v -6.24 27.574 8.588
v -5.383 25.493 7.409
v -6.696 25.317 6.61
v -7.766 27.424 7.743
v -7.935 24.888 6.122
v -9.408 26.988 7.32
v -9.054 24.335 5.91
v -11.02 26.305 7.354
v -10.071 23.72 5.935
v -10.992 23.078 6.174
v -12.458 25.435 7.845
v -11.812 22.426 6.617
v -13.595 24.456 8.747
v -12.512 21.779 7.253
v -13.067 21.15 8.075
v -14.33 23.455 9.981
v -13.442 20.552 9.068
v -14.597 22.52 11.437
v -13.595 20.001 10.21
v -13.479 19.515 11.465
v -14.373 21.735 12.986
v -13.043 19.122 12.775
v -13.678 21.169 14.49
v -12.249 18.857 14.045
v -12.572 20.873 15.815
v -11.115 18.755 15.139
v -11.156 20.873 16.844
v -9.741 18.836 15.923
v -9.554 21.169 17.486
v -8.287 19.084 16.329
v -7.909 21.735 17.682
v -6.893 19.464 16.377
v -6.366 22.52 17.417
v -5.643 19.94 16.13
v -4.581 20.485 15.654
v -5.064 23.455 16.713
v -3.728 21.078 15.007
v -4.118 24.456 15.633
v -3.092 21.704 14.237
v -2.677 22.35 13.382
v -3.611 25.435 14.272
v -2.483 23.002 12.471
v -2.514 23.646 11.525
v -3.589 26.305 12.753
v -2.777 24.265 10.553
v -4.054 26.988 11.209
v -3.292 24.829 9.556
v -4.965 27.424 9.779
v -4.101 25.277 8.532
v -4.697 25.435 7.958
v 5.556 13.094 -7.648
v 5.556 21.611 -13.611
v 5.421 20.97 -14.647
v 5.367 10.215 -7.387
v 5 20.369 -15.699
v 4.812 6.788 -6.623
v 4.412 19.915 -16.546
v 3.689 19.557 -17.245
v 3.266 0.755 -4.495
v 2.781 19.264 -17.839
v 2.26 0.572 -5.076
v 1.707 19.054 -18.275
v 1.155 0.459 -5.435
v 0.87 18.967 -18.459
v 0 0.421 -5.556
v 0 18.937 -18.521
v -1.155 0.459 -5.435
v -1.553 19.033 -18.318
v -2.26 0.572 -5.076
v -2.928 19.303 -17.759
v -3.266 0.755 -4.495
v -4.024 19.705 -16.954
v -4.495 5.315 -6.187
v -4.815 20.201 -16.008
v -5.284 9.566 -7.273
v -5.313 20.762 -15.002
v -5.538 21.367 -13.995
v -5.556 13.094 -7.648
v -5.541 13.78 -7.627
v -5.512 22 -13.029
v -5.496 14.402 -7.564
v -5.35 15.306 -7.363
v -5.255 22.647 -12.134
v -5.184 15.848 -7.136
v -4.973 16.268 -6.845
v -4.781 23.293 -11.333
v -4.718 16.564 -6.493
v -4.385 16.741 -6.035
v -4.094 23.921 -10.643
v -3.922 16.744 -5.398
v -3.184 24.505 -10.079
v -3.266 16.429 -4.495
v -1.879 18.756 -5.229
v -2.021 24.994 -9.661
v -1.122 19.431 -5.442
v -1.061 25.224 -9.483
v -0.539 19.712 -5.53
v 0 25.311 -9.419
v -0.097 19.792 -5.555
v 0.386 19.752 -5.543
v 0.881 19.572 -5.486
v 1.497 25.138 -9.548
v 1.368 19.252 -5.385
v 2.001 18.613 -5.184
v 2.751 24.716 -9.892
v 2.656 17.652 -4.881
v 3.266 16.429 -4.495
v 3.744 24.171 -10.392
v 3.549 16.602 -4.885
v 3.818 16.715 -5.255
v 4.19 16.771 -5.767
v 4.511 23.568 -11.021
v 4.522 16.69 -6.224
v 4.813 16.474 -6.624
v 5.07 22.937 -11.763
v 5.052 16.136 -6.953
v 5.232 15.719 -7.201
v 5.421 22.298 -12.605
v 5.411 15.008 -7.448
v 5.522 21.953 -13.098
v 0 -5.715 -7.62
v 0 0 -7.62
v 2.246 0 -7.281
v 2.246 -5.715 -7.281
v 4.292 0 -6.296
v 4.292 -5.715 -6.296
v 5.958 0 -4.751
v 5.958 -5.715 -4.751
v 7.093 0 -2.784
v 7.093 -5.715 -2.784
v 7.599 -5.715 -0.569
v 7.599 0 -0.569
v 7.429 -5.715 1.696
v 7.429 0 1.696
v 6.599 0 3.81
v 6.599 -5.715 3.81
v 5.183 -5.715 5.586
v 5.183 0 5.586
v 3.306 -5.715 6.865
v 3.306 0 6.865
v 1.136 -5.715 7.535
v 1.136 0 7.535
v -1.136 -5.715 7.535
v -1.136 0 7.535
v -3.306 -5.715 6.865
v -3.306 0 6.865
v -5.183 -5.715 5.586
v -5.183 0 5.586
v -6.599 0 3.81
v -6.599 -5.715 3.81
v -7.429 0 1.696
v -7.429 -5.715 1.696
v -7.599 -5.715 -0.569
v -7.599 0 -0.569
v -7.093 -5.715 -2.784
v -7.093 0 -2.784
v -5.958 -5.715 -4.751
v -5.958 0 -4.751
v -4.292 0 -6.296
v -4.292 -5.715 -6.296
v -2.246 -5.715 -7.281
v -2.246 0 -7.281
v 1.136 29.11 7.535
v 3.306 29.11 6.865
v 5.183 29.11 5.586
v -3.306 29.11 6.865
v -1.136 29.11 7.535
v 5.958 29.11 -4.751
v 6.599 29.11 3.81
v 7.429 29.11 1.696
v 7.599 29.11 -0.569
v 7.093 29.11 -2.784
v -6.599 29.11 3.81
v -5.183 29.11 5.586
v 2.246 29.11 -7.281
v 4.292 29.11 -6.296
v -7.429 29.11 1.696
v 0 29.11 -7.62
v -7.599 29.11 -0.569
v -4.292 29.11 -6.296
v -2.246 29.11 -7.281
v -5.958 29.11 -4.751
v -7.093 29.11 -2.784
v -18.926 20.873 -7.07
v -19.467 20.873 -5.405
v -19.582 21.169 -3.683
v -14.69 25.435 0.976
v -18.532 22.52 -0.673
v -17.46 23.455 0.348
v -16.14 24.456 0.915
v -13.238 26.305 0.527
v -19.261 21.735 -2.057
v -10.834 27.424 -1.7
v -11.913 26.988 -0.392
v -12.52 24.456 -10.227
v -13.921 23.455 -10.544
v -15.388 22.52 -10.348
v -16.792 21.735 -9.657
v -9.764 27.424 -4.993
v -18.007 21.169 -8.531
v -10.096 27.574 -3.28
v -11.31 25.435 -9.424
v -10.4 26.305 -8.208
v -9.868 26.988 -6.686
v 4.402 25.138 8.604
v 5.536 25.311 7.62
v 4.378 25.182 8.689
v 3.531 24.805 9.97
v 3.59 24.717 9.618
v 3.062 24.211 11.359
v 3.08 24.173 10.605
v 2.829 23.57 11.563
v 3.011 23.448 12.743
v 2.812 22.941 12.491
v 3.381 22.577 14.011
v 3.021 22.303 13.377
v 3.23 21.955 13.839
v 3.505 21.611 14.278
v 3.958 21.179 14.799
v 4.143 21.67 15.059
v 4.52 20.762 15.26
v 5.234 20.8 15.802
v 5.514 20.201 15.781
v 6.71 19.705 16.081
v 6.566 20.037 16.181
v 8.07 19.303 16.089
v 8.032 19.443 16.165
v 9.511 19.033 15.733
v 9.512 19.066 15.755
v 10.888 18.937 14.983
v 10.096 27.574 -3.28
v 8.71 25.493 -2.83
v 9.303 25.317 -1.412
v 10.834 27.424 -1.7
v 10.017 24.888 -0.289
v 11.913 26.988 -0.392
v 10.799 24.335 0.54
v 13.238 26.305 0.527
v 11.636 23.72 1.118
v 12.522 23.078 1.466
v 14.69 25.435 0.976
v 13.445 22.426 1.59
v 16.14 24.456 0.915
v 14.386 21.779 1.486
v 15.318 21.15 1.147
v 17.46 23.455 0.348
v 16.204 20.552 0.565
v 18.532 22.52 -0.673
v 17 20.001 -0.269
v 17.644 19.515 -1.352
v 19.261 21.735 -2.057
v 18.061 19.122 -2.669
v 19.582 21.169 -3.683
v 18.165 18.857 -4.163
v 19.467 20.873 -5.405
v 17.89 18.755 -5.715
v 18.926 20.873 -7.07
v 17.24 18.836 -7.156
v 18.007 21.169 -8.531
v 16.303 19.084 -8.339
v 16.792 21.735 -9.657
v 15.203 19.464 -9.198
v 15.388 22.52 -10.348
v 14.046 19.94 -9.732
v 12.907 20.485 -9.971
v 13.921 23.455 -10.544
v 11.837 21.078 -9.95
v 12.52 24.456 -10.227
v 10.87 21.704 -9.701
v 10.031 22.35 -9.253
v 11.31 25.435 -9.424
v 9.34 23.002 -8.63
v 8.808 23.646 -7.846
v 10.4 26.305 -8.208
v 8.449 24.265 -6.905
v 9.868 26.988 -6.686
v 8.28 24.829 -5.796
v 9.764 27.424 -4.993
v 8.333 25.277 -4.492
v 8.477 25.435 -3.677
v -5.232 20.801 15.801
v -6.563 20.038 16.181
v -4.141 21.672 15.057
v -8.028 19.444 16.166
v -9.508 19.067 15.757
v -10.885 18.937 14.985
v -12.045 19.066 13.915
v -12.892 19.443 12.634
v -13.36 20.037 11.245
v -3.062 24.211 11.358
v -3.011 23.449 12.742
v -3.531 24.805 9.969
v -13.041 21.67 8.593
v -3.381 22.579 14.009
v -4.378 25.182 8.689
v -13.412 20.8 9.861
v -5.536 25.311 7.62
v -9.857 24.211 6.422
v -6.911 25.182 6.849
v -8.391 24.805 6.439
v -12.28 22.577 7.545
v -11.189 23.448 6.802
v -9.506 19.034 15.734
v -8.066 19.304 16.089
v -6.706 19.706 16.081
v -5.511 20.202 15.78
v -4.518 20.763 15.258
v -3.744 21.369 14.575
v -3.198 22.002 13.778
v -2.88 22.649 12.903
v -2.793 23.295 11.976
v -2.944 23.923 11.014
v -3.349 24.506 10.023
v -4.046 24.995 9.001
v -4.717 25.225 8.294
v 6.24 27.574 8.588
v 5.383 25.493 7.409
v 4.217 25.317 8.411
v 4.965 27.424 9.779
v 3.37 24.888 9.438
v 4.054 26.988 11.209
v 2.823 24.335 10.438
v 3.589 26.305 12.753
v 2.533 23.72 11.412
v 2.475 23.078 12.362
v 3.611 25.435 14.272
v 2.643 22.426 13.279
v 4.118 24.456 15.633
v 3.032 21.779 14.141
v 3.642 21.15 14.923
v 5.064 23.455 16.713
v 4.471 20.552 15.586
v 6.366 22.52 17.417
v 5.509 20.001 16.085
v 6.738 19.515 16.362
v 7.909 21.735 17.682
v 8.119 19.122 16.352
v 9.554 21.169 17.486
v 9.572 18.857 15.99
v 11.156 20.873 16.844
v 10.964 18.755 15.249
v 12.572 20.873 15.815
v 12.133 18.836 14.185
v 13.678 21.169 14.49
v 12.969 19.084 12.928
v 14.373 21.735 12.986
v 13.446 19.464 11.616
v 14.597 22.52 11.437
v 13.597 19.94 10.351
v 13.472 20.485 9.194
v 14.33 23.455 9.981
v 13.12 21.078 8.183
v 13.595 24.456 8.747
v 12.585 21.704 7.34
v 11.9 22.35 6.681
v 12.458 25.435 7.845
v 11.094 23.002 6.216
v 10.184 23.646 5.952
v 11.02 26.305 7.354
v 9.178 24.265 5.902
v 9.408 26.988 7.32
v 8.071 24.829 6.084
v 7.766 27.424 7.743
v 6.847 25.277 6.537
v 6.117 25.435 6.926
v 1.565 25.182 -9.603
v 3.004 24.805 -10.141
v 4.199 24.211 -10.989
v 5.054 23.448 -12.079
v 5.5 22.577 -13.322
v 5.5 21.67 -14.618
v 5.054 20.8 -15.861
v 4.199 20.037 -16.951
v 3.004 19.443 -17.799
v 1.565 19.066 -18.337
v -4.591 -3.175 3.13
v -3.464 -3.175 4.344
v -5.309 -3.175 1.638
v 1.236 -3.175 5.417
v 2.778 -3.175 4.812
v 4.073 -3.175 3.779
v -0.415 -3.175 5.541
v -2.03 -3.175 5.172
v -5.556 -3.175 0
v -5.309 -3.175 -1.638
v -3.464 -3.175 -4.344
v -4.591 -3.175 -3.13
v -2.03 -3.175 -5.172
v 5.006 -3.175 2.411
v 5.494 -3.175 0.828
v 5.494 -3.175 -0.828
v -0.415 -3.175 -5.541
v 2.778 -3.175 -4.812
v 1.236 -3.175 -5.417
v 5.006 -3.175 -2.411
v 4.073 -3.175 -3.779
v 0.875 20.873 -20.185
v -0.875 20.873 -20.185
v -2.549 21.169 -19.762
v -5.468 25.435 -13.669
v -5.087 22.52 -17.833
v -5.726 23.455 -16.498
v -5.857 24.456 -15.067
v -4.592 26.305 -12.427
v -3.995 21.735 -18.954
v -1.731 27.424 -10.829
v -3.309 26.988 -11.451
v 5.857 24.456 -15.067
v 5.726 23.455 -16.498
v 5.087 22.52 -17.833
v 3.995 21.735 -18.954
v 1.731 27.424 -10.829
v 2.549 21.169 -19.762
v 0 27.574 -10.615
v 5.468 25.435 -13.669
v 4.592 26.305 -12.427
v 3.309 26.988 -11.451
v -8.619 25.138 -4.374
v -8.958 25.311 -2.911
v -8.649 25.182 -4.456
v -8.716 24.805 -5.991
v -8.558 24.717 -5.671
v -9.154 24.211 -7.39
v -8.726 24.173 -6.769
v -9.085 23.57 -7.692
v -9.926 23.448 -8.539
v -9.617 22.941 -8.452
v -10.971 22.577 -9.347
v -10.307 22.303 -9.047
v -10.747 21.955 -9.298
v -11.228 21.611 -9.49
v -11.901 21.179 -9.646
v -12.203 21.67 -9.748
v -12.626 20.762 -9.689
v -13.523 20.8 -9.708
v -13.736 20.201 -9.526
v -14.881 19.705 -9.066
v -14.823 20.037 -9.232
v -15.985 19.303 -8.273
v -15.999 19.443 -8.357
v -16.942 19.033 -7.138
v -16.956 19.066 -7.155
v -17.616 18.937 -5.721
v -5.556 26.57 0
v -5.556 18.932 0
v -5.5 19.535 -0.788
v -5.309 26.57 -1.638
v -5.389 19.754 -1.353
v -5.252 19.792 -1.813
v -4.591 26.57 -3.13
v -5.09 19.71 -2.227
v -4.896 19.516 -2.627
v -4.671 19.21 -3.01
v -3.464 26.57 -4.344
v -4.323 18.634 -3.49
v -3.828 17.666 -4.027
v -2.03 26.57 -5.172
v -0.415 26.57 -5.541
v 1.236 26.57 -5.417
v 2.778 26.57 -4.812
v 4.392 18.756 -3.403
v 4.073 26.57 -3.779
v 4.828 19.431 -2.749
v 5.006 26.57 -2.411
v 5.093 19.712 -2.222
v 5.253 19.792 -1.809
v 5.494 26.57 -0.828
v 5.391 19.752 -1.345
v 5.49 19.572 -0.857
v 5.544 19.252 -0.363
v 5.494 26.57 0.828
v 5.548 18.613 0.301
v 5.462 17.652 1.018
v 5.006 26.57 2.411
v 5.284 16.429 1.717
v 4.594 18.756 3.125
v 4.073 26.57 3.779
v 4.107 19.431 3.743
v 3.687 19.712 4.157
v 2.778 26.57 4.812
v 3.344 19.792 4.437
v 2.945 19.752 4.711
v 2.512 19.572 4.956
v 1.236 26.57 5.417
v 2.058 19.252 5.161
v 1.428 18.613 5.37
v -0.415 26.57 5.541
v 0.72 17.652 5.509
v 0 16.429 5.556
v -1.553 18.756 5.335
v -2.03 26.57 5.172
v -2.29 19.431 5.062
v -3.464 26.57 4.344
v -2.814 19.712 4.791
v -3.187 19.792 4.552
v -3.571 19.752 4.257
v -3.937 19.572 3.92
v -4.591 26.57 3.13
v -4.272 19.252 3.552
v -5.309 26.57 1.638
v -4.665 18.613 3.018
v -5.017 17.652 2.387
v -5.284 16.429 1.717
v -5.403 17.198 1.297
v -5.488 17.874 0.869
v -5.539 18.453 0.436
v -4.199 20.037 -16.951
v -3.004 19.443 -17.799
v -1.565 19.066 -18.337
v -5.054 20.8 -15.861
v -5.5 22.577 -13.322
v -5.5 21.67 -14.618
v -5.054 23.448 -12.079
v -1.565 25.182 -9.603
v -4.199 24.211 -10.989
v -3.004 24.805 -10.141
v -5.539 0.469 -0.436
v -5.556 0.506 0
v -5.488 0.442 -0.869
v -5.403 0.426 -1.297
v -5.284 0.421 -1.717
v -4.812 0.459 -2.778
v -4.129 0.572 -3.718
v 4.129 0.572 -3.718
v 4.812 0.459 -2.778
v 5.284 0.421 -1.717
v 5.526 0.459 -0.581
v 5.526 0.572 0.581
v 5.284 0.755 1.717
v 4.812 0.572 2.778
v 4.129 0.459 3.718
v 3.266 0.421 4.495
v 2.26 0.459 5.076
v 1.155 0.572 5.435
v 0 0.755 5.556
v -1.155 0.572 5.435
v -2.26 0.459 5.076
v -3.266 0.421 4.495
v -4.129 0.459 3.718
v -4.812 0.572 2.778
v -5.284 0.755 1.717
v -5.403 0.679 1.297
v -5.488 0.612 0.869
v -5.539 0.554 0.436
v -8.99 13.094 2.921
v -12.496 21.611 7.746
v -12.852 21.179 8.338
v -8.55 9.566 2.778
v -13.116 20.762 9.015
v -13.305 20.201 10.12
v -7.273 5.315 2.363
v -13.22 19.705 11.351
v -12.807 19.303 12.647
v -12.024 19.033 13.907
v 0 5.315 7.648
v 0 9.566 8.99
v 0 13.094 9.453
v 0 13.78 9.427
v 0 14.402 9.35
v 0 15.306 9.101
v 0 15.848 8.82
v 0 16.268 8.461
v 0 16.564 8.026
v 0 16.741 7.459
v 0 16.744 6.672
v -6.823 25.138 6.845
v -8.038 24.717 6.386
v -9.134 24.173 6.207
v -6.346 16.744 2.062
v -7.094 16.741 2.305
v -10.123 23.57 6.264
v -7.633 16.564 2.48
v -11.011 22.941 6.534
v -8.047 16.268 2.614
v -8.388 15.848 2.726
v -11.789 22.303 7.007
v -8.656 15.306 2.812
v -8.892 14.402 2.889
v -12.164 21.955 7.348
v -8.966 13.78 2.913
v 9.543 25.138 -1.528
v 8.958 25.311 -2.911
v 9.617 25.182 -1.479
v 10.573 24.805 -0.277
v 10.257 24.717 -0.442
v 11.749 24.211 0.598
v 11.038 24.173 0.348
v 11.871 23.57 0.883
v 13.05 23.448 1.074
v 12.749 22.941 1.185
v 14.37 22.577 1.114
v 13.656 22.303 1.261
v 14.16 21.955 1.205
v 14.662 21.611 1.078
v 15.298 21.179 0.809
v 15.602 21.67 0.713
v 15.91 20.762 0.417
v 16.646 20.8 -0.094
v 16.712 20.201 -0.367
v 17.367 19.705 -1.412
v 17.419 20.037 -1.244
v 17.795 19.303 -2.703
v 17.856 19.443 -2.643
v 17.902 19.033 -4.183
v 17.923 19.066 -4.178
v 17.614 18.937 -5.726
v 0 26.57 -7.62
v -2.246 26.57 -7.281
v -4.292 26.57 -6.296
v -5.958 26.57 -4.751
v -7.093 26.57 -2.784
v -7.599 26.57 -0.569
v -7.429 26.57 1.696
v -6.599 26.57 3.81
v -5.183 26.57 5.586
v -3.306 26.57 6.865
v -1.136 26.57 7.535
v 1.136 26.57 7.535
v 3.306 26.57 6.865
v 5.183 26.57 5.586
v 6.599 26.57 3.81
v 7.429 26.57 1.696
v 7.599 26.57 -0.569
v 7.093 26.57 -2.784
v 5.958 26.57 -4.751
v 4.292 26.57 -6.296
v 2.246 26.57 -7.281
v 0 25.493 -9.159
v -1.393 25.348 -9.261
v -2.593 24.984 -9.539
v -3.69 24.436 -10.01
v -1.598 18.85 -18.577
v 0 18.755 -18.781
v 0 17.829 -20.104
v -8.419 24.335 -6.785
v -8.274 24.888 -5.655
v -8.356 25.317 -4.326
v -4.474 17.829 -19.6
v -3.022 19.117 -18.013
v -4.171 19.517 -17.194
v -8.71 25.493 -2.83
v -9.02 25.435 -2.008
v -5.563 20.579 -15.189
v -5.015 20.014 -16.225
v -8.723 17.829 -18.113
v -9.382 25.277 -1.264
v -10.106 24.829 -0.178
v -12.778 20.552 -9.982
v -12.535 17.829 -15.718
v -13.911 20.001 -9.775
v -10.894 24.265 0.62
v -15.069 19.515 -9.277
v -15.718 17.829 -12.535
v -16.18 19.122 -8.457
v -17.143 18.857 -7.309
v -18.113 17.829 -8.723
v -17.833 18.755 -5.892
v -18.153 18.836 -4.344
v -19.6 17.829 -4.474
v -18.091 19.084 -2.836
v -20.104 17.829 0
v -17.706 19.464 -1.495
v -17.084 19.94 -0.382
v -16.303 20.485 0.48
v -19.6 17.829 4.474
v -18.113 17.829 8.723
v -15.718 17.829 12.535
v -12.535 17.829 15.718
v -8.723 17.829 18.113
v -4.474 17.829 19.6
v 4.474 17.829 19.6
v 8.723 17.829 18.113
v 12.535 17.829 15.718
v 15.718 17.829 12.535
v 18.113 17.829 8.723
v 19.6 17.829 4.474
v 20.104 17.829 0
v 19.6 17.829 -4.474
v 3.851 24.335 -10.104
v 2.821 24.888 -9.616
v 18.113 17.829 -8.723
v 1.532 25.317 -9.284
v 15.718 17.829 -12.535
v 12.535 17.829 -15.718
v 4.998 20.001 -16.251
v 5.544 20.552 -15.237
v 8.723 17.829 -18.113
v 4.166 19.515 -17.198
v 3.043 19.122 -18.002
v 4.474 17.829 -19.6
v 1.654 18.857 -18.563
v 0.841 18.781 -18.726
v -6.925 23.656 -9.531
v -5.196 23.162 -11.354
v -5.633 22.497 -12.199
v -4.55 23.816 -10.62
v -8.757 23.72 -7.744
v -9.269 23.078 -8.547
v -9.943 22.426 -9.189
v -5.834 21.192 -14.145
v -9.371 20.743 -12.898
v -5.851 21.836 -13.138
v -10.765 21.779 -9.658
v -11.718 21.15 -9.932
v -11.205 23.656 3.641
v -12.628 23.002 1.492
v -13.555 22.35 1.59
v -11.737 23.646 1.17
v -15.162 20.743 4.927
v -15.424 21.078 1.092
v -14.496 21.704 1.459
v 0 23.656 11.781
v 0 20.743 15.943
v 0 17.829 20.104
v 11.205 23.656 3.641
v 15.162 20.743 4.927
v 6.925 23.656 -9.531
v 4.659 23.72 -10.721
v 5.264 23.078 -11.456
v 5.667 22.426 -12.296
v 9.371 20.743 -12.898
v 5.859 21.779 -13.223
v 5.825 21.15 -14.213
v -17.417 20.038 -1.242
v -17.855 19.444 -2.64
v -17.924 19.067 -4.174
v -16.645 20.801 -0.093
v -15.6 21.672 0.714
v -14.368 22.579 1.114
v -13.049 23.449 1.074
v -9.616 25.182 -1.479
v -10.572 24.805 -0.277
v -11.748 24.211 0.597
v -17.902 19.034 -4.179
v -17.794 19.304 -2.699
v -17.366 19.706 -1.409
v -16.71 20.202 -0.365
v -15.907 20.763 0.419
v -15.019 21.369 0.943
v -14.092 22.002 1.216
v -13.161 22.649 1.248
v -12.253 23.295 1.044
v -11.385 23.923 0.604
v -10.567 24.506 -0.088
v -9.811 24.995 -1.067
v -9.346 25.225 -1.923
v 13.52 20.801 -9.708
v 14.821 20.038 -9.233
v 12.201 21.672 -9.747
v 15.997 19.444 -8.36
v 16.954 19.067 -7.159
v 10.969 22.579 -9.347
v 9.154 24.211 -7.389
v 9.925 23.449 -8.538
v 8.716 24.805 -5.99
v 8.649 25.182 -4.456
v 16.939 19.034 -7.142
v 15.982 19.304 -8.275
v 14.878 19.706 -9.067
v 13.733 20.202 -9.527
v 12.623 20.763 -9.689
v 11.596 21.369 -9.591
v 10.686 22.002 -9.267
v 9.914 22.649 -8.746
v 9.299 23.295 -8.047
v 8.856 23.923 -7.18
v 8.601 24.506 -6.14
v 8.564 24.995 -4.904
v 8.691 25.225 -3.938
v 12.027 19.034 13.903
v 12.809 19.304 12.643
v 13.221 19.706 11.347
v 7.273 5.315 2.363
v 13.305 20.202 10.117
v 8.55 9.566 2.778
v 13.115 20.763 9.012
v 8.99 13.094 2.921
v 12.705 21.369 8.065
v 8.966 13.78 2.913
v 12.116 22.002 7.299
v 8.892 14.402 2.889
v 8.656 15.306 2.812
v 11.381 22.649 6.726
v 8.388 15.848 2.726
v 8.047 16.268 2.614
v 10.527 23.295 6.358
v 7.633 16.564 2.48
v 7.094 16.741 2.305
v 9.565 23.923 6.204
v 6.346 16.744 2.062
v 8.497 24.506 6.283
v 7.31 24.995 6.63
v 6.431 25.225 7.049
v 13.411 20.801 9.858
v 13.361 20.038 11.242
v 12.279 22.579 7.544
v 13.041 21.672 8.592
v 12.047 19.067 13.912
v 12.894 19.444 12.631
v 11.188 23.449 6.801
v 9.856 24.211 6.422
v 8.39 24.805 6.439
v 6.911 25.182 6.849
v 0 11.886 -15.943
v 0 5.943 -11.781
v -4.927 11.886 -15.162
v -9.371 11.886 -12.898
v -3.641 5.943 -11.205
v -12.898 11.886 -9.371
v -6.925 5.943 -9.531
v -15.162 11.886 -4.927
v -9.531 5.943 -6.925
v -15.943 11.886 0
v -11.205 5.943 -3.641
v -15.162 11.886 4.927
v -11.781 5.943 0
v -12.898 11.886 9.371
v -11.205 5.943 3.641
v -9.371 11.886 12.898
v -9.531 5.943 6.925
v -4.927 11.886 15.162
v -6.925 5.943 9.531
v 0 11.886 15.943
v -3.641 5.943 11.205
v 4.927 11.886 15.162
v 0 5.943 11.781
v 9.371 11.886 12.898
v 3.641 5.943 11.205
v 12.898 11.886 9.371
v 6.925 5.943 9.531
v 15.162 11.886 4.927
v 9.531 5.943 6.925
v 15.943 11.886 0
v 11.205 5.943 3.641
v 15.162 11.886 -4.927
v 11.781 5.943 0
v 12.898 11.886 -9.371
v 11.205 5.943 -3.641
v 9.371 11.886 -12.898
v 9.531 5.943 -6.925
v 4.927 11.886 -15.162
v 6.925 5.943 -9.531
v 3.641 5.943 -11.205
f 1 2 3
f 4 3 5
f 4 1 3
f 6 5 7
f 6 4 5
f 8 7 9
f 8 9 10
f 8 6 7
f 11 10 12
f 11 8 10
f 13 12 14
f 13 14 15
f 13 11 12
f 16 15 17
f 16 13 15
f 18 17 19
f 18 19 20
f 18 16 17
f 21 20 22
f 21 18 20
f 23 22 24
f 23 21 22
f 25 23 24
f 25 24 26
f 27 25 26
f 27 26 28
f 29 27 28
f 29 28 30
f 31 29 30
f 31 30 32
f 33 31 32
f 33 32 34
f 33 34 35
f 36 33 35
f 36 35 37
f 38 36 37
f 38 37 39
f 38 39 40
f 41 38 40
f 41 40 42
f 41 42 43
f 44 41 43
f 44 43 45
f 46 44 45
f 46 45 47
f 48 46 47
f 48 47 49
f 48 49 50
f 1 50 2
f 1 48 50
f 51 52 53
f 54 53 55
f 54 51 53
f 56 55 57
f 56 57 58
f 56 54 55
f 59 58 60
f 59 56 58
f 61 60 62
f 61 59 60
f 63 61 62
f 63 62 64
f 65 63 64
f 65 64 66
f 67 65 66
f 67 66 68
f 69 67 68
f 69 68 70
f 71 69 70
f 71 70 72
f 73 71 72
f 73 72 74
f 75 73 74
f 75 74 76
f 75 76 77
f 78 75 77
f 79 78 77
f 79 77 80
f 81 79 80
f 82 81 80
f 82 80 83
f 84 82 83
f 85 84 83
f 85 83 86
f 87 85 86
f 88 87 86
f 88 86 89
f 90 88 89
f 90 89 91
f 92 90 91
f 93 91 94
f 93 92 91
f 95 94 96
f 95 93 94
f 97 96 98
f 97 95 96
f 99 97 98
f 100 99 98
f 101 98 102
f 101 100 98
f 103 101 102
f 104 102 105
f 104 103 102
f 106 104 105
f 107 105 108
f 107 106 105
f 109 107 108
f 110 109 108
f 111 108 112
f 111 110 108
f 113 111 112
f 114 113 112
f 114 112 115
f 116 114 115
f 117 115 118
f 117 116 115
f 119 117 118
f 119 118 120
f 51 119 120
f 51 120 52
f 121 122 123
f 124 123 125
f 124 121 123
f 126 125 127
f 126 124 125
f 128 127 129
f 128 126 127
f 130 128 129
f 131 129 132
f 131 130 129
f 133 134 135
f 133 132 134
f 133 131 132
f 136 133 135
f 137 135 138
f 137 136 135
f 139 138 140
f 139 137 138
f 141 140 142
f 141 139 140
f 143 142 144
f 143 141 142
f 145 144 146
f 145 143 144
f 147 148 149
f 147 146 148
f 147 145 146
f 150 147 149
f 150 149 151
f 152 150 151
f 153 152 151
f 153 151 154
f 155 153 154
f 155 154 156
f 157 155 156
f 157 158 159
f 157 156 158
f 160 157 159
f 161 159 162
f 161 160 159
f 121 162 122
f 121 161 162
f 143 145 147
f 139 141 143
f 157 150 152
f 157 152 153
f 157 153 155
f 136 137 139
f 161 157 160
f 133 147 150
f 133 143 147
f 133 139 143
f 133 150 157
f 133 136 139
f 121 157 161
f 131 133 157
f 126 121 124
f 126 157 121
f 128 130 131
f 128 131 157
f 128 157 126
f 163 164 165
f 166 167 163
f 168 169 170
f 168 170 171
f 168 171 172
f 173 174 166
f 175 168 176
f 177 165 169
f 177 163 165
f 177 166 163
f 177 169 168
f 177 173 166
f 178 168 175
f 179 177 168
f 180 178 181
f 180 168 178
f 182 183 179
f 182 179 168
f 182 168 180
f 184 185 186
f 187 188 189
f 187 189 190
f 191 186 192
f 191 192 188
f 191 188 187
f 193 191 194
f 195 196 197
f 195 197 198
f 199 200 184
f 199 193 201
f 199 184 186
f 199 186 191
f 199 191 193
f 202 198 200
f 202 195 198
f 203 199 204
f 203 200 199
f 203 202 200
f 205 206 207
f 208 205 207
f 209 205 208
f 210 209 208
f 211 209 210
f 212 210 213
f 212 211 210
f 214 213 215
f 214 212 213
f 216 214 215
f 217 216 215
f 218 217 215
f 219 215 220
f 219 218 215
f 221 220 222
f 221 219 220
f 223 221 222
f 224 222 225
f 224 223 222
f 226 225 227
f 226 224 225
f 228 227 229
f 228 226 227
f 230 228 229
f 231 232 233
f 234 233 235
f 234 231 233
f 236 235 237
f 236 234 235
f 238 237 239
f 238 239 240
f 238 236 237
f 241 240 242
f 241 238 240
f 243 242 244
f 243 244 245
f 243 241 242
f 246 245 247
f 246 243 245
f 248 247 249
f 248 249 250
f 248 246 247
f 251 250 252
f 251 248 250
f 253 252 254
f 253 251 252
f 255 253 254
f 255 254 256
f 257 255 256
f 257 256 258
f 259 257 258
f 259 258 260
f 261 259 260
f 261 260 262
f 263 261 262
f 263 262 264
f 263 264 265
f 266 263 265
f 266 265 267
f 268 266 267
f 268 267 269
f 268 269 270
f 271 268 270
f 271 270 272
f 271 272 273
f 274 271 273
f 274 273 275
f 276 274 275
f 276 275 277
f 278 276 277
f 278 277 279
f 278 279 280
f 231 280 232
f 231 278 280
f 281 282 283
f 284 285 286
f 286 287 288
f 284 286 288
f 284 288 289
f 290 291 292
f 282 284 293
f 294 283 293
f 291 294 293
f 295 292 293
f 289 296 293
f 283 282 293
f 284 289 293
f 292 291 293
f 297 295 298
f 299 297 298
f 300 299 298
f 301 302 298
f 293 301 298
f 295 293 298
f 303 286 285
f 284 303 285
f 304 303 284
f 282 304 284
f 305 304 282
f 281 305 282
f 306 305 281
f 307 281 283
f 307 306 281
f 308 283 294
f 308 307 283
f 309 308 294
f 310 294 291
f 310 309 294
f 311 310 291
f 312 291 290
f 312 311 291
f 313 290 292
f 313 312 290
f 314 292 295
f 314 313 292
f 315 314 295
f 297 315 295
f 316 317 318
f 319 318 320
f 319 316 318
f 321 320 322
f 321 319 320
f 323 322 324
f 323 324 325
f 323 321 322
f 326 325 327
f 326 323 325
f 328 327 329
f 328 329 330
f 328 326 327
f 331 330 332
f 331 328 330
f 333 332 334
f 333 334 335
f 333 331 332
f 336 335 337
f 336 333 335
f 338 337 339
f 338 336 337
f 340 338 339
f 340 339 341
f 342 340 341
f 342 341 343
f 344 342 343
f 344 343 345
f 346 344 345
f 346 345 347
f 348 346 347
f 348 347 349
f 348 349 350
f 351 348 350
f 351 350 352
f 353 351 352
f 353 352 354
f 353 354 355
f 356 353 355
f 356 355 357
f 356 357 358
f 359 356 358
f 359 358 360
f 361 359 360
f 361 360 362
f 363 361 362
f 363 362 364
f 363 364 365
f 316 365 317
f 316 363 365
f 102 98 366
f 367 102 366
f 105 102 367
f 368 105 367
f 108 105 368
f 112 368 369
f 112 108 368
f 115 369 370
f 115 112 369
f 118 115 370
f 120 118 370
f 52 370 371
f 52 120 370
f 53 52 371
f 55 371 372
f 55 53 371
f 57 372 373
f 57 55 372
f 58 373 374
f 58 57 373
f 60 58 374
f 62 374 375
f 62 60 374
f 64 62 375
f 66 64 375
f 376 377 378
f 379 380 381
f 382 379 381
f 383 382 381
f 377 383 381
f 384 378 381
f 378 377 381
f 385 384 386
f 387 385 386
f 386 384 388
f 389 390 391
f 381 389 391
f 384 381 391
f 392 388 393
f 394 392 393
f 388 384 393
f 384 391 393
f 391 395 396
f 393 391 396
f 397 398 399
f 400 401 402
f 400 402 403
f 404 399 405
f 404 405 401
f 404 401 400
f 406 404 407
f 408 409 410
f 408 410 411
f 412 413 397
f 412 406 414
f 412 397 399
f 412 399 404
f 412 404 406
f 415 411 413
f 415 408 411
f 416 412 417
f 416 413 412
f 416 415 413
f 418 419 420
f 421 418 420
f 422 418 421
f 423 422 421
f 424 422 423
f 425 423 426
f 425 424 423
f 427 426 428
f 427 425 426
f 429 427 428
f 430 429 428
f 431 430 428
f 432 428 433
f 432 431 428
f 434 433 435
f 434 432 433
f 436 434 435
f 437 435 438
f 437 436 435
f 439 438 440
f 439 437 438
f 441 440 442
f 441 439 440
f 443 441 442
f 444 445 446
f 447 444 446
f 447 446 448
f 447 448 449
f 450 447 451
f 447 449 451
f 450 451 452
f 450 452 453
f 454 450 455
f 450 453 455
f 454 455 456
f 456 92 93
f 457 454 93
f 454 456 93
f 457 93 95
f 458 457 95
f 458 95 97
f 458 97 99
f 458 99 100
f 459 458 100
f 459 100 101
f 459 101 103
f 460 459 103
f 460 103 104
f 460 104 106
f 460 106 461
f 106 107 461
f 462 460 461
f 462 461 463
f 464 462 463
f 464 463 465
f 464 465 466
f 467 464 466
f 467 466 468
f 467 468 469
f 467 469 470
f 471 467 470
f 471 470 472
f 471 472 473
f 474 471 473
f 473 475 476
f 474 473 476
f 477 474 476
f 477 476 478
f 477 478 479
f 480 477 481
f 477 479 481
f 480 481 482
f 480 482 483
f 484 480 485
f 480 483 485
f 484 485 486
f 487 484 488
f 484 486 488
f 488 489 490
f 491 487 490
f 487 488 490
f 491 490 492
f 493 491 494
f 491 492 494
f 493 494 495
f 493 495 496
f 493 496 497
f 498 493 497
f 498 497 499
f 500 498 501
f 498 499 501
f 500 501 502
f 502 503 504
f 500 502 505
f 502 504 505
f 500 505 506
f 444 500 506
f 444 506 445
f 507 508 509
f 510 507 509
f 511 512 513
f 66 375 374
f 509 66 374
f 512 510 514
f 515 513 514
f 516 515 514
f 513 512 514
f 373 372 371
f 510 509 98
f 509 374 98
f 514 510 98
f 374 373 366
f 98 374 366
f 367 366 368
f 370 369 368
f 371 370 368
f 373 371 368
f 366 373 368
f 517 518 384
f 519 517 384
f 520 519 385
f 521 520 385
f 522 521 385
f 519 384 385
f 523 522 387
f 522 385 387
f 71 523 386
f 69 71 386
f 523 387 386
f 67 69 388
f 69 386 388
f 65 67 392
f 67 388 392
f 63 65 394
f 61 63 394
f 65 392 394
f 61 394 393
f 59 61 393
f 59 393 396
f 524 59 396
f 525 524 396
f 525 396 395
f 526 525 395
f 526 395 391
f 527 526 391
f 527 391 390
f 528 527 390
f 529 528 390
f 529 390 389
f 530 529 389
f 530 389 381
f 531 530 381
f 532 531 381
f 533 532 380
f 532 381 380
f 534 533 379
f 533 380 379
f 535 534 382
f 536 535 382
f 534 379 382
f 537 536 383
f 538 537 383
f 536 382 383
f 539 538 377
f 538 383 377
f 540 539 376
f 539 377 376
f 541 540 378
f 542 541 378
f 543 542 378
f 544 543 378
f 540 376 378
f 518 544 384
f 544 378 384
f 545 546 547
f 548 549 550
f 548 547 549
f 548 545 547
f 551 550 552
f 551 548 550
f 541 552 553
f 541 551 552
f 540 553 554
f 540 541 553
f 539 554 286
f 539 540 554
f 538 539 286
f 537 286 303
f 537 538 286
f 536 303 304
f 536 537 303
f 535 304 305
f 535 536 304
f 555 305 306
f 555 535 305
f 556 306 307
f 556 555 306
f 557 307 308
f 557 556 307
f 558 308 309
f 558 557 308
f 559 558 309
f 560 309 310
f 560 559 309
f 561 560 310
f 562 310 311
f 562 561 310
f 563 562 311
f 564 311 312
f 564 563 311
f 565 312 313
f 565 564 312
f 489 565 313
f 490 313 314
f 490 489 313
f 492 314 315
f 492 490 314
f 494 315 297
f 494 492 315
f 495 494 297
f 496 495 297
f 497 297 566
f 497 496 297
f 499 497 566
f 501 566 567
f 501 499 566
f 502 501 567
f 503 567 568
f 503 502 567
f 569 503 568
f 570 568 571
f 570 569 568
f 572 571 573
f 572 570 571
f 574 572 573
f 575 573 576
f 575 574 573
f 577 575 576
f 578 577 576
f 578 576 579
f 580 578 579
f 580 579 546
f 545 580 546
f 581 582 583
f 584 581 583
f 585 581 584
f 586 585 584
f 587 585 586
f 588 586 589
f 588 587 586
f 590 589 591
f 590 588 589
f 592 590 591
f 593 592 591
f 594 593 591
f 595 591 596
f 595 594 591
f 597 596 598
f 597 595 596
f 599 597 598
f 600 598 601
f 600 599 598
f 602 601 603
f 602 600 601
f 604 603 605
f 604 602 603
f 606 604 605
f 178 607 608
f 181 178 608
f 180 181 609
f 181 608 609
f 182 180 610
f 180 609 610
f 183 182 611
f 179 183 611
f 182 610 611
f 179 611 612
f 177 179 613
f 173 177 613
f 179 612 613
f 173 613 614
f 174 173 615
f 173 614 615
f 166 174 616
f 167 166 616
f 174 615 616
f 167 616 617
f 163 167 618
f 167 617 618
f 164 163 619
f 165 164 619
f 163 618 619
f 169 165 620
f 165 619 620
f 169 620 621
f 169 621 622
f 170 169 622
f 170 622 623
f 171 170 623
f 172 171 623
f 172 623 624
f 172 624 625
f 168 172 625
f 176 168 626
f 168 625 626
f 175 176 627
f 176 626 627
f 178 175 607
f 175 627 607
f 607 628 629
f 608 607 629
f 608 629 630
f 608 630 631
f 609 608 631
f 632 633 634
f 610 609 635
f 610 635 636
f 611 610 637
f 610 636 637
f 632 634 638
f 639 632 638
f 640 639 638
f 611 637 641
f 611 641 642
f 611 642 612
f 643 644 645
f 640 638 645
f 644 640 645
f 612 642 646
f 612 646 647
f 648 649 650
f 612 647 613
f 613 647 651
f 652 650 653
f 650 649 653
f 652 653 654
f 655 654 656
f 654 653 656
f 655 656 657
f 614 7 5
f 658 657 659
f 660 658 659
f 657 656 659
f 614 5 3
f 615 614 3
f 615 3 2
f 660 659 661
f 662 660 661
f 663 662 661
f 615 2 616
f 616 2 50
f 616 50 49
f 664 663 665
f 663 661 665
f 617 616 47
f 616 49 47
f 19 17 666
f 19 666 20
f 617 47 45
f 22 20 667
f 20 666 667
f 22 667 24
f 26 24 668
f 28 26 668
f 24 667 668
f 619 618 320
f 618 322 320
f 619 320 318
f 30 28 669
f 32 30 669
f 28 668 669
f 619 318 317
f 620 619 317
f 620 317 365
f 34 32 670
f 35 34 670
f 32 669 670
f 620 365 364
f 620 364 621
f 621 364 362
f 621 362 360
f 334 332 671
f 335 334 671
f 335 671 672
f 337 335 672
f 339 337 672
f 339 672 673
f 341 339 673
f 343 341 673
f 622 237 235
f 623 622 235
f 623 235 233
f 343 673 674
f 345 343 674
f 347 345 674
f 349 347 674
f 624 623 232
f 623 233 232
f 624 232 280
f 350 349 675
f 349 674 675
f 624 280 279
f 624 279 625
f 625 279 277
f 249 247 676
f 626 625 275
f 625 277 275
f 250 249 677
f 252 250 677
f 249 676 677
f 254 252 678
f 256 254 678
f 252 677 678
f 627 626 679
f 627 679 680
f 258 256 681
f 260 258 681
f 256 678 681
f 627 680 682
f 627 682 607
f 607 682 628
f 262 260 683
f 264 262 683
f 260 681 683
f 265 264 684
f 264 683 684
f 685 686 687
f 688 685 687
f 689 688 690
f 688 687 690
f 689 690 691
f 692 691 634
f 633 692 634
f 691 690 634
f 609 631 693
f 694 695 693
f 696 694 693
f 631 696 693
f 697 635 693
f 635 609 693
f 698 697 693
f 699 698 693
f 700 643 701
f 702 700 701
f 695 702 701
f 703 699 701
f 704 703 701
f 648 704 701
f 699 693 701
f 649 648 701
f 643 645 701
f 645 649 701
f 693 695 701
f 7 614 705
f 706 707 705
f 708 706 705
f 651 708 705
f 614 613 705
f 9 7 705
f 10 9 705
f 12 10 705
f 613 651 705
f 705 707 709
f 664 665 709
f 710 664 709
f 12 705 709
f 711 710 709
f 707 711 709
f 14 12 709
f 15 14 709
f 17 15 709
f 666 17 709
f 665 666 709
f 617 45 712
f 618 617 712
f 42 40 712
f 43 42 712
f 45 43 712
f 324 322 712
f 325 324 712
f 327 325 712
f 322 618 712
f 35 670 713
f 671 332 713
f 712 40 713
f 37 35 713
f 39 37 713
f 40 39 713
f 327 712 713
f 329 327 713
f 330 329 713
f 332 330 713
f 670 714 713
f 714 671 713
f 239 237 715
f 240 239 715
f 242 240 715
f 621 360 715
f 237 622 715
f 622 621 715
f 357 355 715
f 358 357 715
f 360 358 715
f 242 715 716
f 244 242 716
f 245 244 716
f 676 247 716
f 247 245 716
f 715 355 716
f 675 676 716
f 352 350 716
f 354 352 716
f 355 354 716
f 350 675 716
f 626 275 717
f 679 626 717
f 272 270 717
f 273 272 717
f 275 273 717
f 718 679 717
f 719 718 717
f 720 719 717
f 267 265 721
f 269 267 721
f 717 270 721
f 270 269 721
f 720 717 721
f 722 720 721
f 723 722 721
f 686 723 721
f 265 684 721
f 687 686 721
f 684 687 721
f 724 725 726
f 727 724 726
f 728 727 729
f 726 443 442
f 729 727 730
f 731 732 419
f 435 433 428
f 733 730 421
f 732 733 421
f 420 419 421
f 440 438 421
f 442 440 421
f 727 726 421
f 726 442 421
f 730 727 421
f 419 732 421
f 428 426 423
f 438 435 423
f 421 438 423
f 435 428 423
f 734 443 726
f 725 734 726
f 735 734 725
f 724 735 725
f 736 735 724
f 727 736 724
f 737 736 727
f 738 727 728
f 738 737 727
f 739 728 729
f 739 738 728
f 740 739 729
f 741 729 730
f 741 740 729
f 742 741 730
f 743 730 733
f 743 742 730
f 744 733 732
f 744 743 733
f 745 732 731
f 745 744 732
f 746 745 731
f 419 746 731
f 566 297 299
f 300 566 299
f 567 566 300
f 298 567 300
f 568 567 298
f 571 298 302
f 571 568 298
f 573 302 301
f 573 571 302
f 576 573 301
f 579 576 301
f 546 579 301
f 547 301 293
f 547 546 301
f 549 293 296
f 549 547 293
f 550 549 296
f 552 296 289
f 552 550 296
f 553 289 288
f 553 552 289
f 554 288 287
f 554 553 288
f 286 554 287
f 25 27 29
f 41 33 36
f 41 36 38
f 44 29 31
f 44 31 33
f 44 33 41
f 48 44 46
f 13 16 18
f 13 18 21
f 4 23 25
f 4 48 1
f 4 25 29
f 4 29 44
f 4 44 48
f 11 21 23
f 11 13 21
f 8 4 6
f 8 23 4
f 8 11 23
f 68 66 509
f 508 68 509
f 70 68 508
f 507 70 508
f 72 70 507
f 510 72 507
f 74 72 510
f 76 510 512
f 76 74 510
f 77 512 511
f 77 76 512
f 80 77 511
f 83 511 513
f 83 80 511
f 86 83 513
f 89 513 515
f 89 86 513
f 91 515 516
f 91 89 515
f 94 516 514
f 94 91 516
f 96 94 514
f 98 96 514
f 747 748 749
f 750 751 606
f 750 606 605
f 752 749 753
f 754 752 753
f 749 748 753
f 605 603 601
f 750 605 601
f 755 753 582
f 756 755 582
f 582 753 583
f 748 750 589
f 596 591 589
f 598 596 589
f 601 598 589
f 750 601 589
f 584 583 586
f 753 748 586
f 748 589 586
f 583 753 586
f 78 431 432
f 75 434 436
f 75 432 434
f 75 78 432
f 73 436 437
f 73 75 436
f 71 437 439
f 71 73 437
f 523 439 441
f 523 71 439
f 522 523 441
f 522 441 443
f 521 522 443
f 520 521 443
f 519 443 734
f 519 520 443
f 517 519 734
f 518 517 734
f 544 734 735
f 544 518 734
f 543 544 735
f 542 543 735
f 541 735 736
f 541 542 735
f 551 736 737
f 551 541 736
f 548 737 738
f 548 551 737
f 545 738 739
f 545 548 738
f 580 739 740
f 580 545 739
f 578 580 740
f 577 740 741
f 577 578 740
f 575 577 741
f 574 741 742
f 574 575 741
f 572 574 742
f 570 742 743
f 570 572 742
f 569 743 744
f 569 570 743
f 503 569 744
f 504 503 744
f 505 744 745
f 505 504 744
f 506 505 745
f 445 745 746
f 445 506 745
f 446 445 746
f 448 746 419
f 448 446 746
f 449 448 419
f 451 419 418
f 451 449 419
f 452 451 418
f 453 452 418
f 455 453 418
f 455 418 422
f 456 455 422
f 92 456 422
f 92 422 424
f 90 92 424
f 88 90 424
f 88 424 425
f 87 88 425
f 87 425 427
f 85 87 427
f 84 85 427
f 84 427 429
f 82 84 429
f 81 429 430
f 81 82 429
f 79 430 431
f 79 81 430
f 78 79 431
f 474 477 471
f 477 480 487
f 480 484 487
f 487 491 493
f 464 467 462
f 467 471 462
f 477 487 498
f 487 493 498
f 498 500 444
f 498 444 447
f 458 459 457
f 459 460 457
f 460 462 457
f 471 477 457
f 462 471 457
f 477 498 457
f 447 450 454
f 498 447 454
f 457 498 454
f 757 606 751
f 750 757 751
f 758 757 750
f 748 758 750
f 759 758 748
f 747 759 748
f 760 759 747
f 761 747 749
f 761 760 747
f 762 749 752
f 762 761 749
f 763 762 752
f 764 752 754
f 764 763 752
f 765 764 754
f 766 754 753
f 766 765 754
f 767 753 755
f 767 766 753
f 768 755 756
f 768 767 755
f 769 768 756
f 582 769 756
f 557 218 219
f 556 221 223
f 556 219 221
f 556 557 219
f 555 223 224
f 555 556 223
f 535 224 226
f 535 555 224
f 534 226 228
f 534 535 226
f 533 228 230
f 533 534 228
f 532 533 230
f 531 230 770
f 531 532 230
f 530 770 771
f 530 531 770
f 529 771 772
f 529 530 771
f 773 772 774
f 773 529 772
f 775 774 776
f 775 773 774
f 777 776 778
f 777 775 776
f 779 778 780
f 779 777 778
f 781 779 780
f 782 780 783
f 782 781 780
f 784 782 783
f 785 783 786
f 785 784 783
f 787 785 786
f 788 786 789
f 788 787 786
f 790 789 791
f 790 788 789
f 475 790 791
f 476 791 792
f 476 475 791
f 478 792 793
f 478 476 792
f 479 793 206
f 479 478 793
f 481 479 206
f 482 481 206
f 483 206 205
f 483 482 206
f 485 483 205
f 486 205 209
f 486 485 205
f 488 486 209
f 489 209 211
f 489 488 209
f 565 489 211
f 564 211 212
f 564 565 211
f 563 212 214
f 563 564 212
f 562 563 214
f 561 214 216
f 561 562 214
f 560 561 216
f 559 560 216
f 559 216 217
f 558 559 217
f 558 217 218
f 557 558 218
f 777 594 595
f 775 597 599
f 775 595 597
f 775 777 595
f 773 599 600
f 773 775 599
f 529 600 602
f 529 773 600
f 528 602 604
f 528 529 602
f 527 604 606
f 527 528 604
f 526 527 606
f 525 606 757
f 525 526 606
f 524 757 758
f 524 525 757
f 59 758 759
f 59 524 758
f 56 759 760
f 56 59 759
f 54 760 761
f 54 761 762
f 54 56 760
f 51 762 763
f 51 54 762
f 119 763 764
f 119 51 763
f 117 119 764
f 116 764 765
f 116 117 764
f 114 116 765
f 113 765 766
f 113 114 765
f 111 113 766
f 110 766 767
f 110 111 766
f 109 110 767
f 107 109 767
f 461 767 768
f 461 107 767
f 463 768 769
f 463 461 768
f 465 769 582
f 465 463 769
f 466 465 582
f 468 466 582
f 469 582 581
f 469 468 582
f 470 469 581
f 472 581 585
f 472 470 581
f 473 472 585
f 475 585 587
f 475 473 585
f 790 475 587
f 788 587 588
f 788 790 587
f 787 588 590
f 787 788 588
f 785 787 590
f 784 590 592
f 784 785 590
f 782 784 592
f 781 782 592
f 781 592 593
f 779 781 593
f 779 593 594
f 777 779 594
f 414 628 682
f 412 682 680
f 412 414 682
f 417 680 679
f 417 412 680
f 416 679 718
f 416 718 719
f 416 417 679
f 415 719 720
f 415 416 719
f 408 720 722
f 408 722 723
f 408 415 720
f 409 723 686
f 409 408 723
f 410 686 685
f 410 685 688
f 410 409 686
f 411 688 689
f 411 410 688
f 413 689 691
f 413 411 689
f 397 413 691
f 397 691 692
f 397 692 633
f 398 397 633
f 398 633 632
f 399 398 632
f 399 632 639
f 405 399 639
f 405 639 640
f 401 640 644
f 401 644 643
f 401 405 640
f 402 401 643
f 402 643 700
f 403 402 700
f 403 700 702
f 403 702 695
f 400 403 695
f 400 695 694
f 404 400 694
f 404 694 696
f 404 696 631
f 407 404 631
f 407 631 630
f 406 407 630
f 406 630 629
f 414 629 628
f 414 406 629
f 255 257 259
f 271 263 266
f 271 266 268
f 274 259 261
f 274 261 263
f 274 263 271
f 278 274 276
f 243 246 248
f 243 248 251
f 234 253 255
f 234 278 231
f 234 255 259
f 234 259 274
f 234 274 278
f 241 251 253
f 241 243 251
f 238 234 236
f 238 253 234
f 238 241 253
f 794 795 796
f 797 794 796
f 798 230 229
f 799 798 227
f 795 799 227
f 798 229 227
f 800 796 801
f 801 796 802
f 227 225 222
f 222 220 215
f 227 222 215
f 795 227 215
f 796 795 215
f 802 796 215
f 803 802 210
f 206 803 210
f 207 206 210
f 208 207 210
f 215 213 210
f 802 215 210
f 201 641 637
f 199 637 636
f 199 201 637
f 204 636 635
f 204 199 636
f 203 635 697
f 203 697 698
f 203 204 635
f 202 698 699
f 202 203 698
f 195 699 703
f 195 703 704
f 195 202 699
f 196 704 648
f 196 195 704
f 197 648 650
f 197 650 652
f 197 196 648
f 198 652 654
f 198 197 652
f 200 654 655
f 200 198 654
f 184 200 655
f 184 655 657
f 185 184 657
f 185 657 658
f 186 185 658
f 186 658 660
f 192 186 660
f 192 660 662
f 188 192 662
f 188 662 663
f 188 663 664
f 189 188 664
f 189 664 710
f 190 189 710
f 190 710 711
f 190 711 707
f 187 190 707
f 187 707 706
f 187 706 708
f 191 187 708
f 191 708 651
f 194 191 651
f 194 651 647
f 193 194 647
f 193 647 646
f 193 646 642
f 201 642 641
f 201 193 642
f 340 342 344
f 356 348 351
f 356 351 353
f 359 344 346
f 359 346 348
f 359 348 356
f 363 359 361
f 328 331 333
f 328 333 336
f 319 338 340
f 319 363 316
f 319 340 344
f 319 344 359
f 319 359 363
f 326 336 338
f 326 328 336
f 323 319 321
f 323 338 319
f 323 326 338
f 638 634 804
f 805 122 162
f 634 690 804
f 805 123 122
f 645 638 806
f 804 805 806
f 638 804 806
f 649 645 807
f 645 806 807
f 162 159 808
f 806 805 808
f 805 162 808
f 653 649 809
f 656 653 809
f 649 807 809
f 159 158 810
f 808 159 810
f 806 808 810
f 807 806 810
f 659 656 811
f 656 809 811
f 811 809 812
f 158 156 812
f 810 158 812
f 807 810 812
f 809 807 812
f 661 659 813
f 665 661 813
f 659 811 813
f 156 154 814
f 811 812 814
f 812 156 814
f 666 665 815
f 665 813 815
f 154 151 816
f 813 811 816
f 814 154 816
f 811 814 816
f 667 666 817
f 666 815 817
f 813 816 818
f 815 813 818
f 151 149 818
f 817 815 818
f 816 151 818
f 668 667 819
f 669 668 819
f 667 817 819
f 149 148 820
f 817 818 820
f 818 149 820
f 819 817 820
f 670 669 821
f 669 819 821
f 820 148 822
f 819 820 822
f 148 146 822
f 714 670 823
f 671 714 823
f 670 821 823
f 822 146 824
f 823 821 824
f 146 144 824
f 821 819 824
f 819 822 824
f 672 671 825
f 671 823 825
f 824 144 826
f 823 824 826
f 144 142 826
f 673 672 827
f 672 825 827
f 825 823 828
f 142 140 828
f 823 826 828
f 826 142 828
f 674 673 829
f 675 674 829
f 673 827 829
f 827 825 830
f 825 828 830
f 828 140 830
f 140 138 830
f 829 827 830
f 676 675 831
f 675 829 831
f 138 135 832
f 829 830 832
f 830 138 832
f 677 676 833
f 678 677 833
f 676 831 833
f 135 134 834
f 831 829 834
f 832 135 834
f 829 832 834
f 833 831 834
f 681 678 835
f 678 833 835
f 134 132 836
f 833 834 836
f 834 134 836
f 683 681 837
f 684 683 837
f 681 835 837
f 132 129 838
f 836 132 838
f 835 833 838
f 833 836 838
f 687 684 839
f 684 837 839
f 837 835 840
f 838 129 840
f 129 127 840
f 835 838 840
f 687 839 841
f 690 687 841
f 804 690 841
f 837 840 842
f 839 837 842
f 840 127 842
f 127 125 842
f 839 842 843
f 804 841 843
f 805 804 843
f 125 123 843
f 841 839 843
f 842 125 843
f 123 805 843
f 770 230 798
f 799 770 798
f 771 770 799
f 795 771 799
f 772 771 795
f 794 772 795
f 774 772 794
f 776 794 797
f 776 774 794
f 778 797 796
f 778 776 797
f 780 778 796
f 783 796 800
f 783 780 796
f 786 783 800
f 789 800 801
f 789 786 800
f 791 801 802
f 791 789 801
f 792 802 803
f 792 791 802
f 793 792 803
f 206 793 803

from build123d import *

# Parameters (mm, degrees)
F_7_16_0_4375_DIAMETER_HOLE1_D         = 11.1125
F_7_16_START                           = 1.779676233
F_7_16_0_4375_DIAMETER_HOLE2_OUTLINE_R = 5.55625
F_7_16_0_4375_DIAMETER_HOLE2_DEPTH     = 24.355951698
CIRPATTERN1_COUNT                      = 5
SKETCH11_R                             = 7.62
BOSS_EXTRUDE1_DEPTH                    = 2.54
BOSS_EXTRUDE2_START                    = 2.54
SKETCH12_R                             = 7.62
BOSS_EXTRUDE2_DEPTH                    = 2.54
BOSS_EXTRUDE3_REACH                    = 52.922
SKETCH13_R                             = 5.87375
SKETCH13_R_2                           = 5.55625
CUT_EXTRUDE1_START                     = -3.182233
SKETCH14_R                             = 5.55625
CUT_EXTRUDE1_DEPTH                     = 0.642233
CIRPATTERN3_COUNT                      = 5


# Read off the part's stored shape, not the designer's step: 7/16 (0.4375) Diameter Hole2
with BuildPart() as part:
    # Sketch1 → Revolve1 (revolve)
    with BuildSketch(Plane.XY, mode=Mode.PRIVATE) as revolve1_sk:
        Polygon((0, 0), (0, 26.570129165), (7.62, 26.570129165), (20.103877155, 17.828824275), (7.62, 0), (7.62, -3.175), (0, -3.175), align=None)
    revolve(revolve1_sk.sketch.rotate(Axis((0, 0, 0), (0, 1, 0)), 90), axis=Axis((0, 0, 0), (0, 1, 0)))

    # 7/16 (0.4375) Diameter Hole1 (through all)
    with Locations(Plane(origin=(0, 26.570129165, 0), x_dir=(1, 0, 0), z_dir=(0, 1, 0))):
        with Locations((0, 0)):
            Hole(F_7_16_0_4375_DIAMETER_HOLE1_D / 2)

    # 7/16 (0.4375) Diameter Hole2 outline → 7/16 (0.4375) Diameter Hole2 (cut)
    with BuildSketch(Plane(origin=(0, 0, 0), x_dir=(1, 0, 0), z_dir=(0, 0.8191520442889911, -0.5735764363510472)).offset(F_7_16_START)):
        with Locations((0, -1.246142784)):
            Circle(F_7_16_0_4375_DIAMETER_HOLE2_OUTLINE_R)
    f_7_16_0_4375_diameter_hole2 = extrude(amount=F_7_16_0_4375_DIAMETER_HOLE2_DEPTH, mode=Mode.SUBTRACT)

    # CirPattern1: 7/16 (0.4375) Diameter Hole2 ×5 about axis
    cirpattern1_axis = Axis((0, 26.570129165, 0), (0, 1, 0))
    for i in range(1, CIRPATTERN1_COUNT):
        add(f_7_16_0_4375_diameter_hole2.rotate(cirpattern1_axis, i * 360 / CIRPATTERN1_COUNT), mode=Mode.SUBTRACT)

    # Sketch11 → Boss-Extrude1 (add)
    with BuildSketch(Plane(origin=(0, 26.570129165, 0), x_dir=(1, 0, 0), z_dir=(0, 1, 0))):
        with Locations(Location((0, 0, 0), (0, 0, 90))):
            Circle(SKETCH11_R)
    extrude(amount=BOSS_EXTRUDE1_DEPTH)

    # Sketch12 → Boss-Extrude2 (add)
    with BuildSketch(Plane.XZ.offset(3.175).offset(BOSS_EXTRUDE2_START)):
        with Locations(Location((0, 0, 0), (0, 0, 270))):
            Circle(SKETCH12_R)
    extrude(amount=-BOSS_EXTRUDE2_DEPTH)

    # Boss-Extrude3: up to this cone (the profile starts outside it)
    boss_extrude3_end = Plane(origin=(0, 22.5675805, 0), z_dir=(0, -1, 0)).offset(-9.338129106) * Cone(1.428e-06, 111.014569628, 77.733237505, align=(Align.CENTER, Align.CENTER, Align.MIN), mode=Mode.PRIVATE)
    # Sketch13 → Boss-Extrude3 (add, up to the surface)
    with BuildSketch(Plane(origin=(0, 23.489699353, -16.447664557), x_dir=(1, 0, 0), z_dir=(0, 0.8191520442889909, -0.5735764363510475)), mode=Mode.PRIVATE) as boss_extrude3_sk1:
        with Locations(Location((0, -1.246142784, 0), (0, 0, 270))):
            Circle(SKETCH13_R)
        with Locations(Location((0, -1.246142784, 0), (0, 0, 306))):
            Circle(SKETCH13_R_2, mode=Mode.SUBTRACT)
    boss_extrude3_tool1 = extrude(boss_extrude3_sk1.sketch, amount=-BOSS_EXTRUDE3_REACH, mode=Mode.PRIVATE) - boss_extrude3_end
    # Sketch13 → Boss-Extrude3 (add, up to the surface)
    with BuildSketch(Plane(origin=(0, 23.489699353, -16.447664557), x_dir=(1, 0, 0), z_dir=(0, 0.8191520442889909, -0.5735764363510475)), mode=Mode.PRIVATE) as boss_extrude3_sk2:
        with Locations(Location((0, -1.246142784, 0), (0, 0, 306))):
            Circle(SKETCH13_R_2)
    boss_extrude3_tool2 = extrude(boss_extrude3_sk2.sketch, amount=-BOSS_EXTRUDE3_REACH, mode=Mode.PRIVATE) - boss_extrude3_end
    boss_extrude3 = boss_extrude3_tool1.solids().sort_by_distance((0, 20.930704, -20.102289))[0] + boss_extrude3_tool2.solids().sort_by_distance((0, 24.204457, -15.426884))[0]
    add(boss_extrude3)

    # Sketch14 → Cut-Extrude1 (cut)
    with BuildSketch(Plane(origin=(0, 23.489699353, -16.447664557), x_dir=(1, 0, 0), z_dir=(0, 0.8191520442889909, -0.5735764363510475)).offset(CUT_EXTRUDE1_START)):
        with Locations(Location((0, -1.246142784, 0), (0, 0, 270))):
            Circle(SKETCH14_R)
    cut_extrude1 = extrude(amount=CUT_EXTRUDE1_DEPTH, mode=Mode.SUBTRACT)

    # CirPattern3: Boss-Extrude3, Cut-Extrude1 ×5 about axis
    cirpattern3_axis = Axis((0, 0, 0), (0, 1, 0))
    add([boss_extrude3.rotate(cirpattern3_axis, i * 360 / CIRPATTERN3_COUNT) for i in range(1, CIRPATTERN3_COUNT)])
    add([cut_extrude1.rotate(cirpattern3_axis, i * 360 / CIRPATTERN3_COUNT) for i in range(1, CIRPATTERN3_COUNT)], mode=Mode.SUBTRACT)


solid = part.part
